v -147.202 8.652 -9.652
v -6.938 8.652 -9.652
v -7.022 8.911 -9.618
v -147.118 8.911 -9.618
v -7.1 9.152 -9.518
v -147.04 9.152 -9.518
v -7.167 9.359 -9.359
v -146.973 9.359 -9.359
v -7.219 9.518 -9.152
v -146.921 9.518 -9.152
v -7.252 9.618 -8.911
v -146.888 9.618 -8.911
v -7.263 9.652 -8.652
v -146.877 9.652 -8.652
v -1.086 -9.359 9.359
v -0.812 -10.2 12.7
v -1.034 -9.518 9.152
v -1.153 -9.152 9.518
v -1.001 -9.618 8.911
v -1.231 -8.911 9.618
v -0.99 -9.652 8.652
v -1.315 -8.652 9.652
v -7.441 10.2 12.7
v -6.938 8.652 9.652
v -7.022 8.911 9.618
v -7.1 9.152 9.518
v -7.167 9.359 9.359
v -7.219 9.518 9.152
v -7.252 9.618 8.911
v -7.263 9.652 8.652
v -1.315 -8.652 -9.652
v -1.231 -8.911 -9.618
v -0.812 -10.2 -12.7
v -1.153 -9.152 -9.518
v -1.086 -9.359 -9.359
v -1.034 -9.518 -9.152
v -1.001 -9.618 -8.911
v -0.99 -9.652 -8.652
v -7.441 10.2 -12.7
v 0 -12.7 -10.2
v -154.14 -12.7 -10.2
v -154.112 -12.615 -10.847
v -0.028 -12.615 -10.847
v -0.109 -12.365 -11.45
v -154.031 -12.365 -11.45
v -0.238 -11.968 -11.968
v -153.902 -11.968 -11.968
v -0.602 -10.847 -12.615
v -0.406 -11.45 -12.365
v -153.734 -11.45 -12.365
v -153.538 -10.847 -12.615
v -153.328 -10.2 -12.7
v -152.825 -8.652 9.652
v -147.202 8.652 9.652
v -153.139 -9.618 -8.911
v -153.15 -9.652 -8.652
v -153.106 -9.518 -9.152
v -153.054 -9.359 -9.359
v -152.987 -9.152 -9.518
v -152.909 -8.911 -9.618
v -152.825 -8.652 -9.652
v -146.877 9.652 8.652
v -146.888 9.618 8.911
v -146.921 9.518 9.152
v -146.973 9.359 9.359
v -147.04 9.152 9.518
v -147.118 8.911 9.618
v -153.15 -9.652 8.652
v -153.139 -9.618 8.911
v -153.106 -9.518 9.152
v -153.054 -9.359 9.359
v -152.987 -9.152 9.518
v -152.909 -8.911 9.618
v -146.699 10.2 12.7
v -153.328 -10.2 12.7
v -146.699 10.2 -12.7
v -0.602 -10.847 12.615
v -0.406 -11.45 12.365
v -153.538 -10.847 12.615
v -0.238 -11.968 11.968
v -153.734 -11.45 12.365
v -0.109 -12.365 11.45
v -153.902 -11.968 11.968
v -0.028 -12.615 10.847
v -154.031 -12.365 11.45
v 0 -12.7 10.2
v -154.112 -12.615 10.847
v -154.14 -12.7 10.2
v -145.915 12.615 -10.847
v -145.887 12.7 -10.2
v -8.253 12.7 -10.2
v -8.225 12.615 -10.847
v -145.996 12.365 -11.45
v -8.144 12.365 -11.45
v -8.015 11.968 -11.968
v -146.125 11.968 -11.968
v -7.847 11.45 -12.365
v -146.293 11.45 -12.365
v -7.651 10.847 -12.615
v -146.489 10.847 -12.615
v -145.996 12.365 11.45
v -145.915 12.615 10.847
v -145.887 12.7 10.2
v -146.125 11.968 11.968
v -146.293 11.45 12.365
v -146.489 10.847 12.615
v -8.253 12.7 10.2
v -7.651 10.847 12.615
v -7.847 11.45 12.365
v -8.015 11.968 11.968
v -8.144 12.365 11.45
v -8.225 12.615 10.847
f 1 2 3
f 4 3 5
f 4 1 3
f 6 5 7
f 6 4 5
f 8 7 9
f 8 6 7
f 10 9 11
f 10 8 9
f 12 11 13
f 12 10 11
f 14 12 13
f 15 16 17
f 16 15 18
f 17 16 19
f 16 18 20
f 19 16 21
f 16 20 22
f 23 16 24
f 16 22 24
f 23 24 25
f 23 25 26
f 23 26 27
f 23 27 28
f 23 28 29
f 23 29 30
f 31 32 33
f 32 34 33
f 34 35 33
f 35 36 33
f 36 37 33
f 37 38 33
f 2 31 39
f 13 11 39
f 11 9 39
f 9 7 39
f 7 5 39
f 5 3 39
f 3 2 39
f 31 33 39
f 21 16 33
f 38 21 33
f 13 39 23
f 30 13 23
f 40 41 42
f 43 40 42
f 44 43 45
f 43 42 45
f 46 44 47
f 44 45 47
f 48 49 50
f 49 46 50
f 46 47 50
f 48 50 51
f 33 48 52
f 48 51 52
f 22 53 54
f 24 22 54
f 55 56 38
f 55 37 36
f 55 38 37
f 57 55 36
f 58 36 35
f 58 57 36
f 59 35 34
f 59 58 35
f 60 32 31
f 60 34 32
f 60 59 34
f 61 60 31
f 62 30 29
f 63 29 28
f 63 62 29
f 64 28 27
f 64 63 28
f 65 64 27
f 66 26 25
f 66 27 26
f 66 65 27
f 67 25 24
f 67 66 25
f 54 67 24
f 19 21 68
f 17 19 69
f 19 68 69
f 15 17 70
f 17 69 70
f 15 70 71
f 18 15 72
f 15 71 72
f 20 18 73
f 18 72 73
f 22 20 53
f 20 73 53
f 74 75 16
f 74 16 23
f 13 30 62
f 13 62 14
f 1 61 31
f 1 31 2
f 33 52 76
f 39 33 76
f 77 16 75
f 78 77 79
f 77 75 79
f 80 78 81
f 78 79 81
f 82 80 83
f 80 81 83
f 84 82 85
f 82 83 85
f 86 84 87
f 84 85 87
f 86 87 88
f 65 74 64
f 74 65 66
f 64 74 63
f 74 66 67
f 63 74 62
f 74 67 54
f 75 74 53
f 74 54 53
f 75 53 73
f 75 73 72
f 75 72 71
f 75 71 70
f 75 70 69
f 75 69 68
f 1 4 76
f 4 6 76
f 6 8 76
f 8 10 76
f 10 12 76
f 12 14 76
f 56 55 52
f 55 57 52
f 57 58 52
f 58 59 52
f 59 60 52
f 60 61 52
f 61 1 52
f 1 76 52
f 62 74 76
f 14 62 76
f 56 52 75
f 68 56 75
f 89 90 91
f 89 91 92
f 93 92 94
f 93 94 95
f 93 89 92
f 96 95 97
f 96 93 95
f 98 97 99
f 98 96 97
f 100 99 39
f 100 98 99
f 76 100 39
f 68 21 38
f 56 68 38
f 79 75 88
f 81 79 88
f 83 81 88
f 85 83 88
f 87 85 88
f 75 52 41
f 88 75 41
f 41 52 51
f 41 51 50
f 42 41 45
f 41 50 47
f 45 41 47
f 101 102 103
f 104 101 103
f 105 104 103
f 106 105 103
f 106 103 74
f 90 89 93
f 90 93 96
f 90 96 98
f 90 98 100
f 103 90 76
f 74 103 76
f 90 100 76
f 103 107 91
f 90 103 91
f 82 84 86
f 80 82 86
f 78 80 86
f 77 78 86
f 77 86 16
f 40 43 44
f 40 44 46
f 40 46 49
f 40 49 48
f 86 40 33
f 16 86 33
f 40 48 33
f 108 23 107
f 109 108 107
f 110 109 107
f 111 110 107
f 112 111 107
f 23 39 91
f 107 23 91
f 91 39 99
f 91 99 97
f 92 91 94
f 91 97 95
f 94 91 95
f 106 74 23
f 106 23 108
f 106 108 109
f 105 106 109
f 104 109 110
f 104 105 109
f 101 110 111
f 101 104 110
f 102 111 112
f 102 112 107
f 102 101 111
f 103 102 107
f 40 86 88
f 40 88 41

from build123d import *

# Parameters (mm, degrees)
SKETCH3_W           = 25.4
SKETCH3_H           = 25.4
SKETCH3_W_2         = 19.304
SKETCH3_H_2         = 19.304
BOSS_EXTRUDE1_DEPTH = 154.14
FILLET1_R           = 2.5
FILLET2_R           = 1
CUT_EXTRUDE2_DEPTH  = 157.734136677


with BuildPart() as part:
    # Sketch3 → Boss-Extrude1 (new body)
    with BuildSketch(Plane(origin=(0, 0, 0), x_dir=(0, 0, -1), z_dir=(1, 0, 0))):
        Rectangle(SKETCH3_W, SKETCH3_H)
        Rectangle(SKETCH3_W_2, SKETCH3_H_2, mode=Mode.SUBTRACT)
    extrude(amount=-BOSS_EXTRUDE1_DEPTH)

    # Fillet1
    fillet1_edges = [part.edges().sort_by_distance(p)[0] for p in [
        (-77.07, -12.7, -12.7),
        (-77.07, -12.7, 12.7),
        (-77.07, 12.7, 12.7),
        (-77.07, 12.7, -12.7),
    ]]
    fillet(fillet1_edges, radius=FILLET1_R)

    # Fillet2
    fillet2_edges = [part.edges().sort_by_distance(p)[0] for p in [
        (-77.07, 9.652, -9.652),
        (-77.07, -9.652, -9.652),
        (-77.07, -9.652, 9.652),
        (-77.07, 9.652, 9.652),
    ]]
    fillet(fillet2_edges, radius=FILLET2_R)

    # Sketch5 → Cut-Extrude2 (cut, through all)
    with BuildSketch(Plane(origin=(0, 0, -12.7), x_dir=(-1, 0, 0), z_dir=(0, 0, -1))):
        Polygon((0, 10.2), (7.440661044, 10.2), (8.252960284, 12.7), (0, 12.7), align=None)
        Polygon((0.812299241, -10.2), (7.440661044, 10.2), (0, 10.2), (0, -10.2), align=None)
        Polygon((0, -12.7), (0.812299241, -10.2), (0, -10.2), align=None)
        Polygon((154.14, 10.2), (146.699338956, 10.2), (153.327700759, -10.2), (154.14, -10.2), align=None)
        Polygon((154.14, -10.2), (153.327700759, -10.2), (154.14, -12.7), align=None)
        Polygon((154.14, 12.7), (145.887039716, 12.7), (146.699338956, 10.2), (154.14, 10.2), align=None)
    extrude(amount=-CUT_EXTRUDE2_DEPTH, mode=Mode.SUBTRACT)


solid = part.part
